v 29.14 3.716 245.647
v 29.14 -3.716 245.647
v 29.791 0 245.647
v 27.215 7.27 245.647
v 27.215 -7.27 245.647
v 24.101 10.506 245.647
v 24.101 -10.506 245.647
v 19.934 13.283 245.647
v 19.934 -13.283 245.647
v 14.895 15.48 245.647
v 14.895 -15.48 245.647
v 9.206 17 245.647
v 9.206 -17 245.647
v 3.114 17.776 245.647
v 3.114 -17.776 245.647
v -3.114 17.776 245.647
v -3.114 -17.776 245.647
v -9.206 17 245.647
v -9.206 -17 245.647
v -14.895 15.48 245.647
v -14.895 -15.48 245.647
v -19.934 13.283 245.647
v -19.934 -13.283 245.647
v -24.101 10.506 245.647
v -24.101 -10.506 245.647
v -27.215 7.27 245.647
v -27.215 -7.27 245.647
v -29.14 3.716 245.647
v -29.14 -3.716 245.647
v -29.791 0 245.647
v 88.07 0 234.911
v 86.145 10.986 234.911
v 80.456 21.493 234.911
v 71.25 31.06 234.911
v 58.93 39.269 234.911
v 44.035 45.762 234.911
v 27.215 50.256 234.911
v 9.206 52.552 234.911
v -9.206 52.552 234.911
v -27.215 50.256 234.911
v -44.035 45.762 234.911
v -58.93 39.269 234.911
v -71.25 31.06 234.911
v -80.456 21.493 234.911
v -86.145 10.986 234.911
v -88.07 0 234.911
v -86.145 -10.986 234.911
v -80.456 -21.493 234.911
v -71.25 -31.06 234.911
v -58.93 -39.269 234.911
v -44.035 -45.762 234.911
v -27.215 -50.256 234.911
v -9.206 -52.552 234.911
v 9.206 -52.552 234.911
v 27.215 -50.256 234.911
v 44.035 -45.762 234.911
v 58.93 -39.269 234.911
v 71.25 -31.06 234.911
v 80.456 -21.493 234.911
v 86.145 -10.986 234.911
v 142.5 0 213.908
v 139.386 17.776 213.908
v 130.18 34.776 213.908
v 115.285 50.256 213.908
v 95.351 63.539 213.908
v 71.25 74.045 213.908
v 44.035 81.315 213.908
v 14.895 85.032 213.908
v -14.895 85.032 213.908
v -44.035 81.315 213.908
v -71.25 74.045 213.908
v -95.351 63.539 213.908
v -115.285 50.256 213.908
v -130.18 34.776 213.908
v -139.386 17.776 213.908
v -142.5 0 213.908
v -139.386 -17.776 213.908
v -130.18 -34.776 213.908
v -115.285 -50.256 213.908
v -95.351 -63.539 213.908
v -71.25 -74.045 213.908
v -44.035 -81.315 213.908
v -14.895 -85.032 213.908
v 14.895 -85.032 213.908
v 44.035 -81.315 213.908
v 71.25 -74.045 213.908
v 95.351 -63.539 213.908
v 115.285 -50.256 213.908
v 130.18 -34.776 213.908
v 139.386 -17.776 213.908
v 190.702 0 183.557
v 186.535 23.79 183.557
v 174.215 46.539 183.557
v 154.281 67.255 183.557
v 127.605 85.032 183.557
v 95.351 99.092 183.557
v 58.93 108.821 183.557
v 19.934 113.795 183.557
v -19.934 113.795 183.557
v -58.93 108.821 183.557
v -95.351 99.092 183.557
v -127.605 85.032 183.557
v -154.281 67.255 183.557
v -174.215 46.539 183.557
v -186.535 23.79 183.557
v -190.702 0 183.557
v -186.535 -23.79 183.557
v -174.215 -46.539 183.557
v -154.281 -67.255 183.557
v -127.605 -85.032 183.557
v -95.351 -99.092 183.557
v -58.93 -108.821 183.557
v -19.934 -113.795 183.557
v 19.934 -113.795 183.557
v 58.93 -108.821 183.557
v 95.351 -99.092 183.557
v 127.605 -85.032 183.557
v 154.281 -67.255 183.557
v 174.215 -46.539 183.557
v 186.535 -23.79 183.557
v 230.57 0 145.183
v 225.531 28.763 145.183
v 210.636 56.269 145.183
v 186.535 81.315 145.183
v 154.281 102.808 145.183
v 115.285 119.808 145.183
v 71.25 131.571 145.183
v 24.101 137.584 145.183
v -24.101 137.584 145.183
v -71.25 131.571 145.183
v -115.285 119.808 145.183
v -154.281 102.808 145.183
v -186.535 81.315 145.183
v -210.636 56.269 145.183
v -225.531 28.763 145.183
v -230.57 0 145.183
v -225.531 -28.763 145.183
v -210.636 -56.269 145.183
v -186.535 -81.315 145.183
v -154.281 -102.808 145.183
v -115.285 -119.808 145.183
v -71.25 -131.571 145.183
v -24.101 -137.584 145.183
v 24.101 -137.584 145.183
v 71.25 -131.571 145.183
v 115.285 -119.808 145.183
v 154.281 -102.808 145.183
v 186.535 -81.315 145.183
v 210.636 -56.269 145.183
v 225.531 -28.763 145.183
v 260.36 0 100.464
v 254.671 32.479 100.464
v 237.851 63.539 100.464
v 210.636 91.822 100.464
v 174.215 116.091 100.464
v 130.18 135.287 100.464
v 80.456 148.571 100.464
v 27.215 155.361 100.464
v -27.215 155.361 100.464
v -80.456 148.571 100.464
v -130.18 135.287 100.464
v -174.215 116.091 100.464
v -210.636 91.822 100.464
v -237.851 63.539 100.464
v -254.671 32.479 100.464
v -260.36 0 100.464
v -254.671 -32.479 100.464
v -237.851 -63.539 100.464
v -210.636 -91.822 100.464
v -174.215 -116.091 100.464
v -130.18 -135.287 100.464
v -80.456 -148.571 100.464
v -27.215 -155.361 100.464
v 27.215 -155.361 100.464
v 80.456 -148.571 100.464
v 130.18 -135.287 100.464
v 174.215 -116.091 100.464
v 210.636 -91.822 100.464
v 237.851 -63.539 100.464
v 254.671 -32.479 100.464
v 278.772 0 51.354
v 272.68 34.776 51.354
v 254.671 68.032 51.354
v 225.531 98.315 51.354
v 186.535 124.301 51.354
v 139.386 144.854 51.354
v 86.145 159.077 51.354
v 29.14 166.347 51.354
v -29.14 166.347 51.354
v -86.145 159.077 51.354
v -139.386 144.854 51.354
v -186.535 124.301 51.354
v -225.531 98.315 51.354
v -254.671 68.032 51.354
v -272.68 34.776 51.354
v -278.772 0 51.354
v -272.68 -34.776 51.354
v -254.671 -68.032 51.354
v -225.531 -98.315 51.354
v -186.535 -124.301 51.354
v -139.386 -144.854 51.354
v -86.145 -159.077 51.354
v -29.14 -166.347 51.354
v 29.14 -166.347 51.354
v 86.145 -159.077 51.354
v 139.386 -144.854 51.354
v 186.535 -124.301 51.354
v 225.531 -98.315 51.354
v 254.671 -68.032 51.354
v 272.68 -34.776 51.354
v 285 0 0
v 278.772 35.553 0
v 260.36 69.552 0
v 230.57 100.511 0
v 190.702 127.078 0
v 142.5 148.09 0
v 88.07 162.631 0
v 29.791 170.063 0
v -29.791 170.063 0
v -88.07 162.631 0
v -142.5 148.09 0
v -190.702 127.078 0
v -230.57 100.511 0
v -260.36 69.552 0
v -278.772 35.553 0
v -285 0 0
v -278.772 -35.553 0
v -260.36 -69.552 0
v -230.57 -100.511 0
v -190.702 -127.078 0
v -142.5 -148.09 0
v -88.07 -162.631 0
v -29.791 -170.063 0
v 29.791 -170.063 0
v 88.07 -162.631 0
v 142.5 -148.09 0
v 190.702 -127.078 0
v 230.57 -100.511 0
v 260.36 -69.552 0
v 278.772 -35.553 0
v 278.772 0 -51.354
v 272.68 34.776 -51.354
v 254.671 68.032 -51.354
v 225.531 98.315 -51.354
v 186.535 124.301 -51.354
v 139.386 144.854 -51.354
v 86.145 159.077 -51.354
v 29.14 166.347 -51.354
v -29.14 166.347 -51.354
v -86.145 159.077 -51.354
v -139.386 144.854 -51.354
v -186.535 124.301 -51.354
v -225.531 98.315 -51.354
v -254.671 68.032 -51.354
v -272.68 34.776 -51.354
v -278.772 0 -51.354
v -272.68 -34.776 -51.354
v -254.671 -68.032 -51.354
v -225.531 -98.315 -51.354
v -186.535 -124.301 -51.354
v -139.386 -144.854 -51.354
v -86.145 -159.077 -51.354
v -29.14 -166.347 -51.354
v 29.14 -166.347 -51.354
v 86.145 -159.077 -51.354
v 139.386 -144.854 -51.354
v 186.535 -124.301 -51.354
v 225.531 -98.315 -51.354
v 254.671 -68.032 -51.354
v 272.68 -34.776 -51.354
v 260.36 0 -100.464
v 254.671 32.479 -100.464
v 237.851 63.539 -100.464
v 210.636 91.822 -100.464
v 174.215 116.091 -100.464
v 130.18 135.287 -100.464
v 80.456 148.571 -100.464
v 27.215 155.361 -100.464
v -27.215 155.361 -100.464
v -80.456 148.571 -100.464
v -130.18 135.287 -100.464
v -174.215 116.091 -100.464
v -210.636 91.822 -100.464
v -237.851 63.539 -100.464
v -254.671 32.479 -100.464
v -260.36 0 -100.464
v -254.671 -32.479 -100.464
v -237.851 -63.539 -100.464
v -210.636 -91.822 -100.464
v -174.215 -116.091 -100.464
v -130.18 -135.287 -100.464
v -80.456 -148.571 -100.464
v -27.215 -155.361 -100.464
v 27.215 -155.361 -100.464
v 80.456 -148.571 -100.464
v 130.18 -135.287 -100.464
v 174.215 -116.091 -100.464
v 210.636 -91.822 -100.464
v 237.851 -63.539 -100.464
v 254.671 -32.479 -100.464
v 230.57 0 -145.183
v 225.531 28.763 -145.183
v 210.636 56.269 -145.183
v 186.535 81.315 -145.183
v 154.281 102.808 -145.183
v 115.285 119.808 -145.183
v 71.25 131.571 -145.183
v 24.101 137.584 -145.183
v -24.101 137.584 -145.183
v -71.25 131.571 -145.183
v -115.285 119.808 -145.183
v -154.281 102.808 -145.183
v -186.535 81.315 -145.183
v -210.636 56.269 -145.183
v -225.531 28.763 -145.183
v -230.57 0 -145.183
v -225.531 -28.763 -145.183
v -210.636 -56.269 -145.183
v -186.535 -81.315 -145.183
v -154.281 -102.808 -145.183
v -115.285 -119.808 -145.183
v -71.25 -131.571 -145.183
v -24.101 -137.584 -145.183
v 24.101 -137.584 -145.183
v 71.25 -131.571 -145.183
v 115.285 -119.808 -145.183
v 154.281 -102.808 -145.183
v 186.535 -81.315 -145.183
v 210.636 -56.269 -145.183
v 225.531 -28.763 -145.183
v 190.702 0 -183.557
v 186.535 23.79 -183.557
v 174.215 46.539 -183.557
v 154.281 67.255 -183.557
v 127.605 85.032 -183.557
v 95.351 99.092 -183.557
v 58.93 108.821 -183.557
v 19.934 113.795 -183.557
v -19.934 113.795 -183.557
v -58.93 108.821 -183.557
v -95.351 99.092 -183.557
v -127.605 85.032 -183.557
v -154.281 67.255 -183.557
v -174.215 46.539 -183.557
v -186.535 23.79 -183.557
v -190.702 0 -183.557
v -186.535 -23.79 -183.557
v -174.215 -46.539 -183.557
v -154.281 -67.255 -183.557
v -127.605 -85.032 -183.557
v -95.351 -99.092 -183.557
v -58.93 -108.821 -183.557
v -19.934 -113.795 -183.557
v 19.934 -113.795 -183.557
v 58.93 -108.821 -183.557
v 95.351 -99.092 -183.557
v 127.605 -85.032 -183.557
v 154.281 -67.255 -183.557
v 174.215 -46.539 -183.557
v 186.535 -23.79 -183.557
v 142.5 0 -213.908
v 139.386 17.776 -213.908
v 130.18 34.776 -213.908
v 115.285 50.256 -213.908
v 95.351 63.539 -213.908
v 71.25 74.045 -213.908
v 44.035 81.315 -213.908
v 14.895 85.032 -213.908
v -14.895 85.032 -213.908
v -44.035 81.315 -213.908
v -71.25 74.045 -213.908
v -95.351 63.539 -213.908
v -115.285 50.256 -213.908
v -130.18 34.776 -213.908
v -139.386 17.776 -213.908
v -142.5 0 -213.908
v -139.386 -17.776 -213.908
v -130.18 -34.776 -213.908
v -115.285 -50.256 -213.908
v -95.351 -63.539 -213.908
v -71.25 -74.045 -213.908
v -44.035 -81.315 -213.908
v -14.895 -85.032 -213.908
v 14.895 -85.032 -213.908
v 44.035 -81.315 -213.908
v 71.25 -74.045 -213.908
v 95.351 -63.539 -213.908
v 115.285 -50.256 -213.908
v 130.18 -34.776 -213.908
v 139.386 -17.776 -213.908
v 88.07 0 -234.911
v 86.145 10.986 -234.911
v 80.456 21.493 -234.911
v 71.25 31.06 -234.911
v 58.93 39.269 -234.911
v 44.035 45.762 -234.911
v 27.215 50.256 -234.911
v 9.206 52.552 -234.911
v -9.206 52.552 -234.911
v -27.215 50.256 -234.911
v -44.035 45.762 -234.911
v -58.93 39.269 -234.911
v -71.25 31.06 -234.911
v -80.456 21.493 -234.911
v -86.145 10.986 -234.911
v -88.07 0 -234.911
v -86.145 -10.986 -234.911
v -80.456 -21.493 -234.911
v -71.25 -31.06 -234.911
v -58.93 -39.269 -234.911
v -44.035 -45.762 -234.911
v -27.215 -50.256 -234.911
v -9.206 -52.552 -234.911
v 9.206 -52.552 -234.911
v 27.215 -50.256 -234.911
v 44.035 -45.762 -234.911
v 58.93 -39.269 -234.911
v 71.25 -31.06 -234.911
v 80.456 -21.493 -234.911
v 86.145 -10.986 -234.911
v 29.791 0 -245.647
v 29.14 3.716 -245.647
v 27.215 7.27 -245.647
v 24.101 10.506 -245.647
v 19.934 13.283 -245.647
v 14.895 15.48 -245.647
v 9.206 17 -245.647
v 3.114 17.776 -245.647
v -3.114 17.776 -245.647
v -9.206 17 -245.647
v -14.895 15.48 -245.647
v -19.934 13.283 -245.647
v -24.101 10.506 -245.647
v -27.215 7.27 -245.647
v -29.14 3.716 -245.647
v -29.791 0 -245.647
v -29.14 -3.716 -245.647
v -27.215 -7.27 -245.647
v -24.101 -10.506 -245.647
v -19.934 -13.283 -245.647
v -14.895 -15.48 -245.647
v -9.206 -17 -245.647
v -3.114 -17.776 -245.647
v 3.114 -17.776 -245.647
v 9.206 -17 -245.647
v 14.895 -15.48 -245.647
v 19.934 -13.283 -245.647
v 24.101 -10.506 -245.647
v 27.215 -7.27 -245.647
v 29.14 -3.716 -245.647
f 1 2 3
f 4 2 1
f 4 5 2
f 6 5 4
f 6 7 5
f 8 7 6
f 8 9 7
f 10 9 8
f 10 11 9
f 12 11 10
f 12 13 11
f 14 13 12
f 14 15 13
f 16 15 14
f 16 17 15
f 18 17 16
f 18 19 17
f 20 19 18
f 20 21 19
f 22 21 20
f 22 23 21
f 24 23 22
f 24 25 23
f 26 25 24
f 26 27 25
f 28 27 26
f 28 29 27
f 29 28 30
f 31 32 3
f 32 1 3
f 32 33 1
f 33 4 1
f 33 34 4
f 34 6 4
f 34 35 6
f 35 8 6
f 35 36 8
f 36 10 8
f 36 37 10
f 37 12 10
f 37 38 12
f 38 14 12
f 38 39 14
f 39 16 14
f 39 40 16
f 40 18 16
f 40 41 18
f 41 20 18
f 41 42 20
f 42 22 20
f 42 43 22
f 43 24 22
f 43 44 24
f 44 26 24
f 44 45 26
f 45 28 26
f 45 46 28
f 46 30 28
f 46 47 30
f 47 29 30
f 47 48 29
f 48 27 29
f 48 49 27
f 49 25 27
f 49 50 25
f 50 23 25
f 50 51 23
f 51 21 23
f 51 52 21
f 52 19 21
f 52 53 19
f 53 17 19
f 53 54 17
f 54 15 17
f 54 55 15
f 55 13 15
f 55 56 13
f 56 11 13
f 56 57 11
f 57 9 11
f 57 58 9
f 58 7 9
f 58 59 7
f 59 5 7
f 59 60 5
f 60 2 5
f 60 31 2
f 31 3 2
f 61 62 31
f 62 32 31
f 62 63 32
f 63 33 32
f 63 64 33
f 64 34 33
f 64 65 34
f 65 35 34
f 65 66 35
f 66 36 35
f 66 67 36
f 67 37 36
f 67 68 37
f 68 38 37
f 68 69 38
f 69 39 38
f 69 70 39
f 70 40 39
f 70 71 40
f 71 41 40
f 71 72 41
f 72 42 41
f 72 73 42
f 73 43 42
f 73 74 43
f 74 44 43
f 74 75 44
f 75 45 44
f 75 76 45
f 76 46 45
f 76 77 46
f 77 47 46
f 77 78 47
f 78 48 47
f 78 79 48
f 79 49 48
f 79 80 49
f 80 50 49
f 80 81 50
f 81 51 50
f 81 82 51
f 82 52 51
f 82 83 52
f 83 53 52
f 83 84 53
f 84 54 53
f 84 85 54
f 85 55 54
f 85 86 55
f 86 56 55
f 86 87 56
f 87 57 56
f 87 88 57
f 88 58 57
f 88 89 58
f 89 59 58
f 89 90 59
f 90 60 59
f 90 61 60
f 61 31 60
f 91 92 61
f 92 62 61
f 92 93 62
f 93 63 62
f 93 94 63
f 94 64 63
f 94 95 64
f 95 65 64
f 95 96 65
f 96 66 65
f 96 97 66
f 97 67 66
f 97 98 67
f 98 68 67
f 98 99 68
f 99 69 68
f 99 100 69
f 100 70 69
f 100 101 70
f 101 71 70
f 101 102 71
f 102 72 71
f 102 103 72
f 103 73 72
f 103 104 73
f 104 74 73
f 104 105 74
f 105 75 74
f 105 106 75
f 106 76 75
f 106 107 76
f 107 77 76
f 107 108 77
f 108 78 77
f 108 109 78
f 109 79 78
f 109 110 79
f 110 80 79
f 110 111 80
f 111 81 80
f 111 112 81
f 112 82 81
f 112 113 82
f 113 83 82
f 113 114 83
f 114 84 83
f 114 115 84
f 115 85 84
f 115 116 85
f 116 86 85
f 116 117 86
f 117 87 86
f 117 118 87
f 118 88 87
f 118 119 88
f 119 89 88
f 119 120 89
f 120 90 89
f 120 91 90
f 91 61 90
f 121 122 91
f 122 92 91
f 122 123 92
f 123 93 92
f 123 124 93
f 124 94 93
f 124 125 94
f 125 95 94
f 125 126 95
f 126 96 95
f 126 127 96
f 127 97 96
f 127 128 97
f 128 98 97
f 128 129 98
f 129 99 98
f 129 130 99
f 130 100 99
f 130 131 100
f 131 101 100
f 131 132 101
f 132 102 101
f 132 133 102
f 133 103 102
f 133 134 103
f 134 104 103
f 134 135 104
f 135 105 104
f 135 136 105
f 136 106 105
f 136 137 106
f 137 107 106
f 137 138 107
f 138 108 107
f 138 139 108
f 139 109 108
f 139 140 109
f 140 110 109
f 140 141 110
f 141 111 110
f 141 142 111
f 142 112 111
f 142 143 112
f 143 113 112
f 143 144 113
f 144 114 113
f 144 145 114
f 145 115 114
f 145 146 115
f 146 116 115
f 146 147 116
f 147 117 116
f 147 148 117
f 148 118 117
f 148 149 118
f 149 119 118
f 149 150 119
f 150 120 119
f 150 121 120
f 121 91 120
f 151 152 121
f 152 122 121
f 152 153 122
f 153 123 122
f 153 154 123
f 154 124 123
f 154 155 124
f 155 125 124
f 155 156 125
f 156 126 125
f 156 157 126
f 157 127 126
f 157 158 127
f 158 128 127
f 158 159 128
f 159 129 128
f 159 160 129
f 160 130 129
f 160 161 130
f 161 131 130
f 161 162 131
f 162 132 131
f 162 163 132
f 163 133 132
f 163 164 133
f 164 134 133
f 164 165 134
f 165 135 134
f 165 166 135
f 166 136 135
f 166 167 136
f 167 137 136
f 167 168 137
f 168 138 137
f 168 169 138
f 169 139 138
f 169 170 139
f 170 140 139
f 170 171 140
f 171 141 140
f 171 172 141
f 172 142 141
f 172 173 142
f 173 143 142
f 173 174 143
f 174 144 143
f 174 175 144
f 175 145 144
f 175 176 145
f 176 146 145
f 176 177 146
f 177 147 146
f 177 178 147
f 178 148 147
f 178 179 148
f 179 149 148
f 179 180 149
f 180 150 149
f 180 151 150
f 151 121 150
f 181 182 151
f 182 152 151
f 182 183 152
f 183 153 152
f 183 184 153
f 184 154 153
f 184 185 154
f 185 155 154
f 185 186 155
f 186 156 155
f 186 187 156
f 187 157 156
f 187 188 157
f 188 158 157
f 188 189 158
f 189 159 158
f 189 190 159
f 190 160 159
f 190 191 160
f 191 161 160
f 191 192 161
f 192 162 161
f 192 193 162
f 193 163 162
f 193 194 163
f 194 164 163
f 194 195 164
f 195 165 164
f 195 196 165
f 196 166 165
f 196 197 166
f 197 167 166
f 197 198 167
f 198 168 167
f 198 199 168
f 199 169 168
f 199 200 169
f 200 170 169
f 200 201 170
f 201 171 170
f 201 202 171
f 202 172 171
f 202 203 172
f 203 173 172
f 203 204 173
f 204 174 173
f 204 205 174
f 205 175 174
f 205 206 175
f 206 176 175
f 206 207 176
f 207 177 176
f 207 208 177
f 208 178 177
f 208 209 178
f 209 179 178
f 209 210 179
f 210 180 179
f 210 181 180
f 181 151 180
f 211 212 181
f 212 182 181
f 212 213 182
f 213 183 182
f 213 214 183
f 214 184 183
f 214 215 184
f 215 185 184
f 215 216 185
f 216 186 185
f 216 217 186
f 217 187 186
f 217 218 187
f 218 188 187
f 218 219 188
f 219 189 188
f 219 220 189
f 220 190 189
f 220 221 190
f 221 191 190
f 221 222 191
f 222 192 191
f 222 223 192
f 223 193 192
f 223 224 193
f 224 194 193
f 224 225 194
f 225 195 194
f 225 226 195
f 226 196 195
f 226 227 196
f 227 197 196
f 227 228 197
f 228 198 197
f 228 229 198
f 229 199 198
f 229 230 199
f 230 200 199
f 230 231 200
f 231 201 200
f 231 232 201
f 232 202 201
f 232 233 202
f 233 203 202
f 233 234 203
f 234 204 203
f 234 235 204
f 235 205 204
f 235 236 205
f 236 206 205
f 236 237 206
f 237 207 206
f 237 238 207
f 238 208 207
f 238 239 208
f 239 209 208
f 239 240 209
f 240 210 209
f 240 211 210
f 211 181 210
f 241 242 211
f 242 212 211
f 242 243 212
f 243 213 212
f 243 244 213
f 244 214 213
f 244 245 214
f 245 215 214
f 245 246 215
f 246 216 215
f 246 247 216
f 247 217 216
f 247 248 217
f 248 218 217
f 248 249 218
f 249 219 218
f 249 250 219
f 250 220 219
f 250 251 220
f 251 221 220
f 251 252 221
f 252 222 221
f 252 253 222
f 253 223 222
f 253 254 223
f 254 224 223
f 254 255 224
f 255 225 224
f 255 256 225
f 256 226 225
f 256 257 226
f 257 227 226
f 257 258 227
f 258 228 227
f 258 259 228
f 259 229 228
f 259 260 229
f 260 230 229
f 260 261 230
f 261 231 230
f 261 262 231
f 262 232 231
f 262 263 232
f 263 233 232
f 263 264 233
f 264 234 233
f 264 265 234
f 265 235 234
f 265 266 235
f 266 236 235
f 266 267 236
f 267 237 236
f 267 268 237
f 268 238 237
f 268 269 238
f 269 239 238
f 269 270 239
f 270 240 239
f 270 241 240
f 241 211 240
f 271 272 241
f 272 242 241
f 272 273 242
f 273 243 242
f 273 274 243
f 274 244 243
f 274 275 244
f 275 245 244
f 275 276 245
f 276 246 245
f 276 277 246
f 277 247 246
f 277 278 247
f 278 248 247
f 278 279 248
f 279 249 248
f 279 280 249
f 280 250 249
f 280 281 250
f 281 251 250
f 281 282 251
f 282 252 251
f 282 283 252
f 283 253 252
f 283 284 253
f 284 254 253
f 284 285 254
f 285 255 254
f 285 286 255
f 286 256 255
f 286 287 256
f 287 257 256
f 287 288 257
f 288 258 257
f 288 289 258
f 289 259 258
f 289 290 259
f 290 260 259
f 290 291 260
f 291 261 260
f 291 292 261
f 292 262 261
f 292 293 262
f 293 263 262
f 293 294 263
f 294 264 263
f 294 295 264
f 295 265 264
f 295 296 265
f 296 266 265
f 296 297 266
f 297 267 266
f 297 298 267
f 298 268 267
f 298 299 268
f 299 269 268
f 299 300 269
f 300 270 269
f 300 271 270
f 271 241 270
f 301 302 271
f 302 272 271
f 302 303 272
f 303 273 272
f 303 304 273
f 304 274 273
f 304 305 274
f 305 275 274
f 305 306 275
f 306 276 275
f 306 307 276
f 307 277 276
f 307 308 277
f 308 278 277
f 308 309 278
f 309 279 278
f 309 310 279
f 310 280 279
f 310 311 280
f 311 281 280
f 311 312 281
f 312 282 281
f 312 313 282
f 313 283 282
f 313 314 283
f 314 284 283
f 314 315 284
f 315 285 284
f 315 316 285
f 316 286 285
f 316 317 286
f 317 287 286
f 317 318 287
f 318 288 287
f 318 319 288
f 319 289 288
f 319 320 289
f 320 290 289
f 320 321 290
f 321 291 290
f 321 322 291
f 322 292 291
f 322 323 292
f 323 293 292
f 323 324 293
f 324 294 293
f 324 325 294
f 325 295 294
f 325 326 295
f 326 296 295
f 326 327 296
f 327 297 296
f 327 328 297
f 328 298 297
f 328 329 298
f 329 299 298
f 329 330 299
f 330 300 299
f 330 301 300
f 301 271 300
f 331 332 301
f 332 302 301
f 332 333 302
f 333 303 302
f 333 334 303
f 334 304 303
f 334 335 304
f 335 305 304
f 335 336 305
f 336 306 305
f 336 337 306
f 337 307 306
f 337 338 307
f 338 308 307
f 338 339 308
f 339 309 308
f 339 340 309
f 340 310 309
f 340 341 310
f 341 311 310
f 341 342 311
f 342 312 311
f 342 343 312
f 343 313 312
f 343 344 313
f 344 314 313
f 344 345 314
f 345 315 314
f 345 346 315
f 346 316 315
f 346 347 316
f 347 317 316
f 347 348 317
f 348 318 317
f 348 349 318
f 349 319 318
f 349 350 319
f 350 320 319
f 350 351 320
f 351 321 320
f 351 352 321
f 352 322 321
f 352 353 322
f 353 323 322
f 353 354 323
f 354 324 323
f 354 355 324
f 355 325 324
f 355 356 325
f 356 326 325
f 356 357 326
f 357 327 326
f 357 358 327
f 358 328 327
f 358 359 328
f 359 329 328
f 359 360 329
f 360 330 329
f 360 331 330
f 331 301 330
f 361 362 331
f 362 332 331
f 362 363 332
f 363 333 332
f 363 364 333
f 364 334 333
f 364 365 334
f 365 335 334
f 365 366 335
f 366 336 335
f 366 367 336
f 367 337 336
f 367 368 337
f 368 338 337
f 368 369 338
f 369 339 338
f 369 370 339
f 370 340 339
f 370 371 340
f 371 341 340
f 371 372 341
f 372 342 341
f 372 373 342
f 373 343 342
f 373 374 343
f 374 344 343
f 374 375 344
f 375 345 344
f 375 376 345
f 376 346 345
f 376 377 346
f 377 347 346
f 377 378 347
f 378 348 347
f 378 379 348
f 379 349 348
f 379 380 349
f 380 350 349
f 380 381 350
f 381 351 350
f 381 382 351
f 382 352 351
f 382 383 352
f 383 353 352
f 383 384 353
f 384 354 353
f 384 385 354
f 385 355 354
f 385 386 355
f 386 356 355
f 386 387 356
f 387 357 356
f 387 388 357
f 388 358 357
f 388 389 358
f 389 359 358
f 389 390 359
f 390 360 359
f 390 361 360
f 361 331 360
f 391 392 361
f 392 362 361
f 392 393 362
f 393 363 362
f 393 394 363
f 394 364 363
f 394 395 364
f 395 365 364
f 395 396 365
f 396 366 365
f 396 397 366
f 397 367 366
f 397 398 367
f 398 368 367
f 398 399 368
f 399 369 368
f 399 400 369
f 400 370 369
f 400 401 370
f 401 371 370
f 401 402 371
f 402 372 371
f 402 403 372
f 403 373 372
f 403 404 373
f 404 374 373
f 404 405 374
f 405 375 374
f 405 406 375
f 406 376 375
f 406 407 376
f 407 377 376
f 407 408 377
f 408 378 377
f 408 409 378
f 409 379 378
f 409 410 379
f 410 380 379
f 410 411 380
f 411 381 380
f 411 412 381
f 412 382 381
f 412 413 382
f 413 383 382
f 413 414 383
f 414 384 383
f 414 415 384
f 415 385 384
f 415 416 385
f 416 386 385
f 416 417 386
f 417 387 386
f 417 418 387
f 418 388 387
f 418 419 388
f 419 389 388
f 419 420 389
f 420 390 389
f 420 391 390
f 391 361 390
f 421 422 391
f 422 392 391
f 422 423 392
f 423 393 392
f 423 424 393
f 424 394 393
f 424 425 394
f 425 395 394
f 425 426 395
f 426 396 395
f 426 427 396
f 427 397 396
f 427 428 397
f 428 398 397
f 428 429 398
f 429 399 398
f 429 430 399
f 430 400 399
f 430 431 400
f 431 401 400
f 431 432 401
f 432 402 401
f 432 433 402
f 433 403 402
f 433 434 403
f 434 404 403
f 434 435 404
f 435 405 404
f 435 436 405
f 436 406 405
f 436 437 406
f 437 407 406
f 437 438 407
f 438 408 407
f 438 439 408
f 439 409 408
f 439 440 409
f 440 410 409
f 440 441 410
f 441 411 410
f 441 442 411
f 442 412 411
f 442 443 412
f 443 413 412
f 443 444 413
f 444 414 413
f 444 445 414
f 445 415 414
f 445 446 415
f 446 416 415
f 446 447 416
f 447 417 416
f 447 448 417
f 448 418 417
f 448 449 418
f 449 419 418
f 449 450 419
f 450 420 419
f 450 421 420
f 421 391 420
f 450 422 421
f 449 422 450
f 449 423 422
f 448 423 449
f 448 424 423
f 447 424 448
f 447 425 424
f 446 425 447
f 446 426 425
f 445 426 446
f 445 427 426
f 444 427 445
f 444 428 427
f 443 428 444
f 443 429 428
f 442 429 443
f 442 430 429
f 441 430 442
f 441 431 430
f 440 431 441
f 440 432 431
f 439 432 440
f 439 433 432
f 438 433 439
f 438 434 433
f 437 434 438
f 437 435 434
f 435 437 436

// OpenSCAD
// Generated by SolidPython 1.0.1 on 2020-07-29 00:46:52


scale(v = [15, 9, 13]) {
	sphere(r = 19);
}
/***********************************************
*********      SolidPython code:      **********
************************************************
 
# import packages: SolidPython
from solid import *
from solid.utils import *
from itertools import chain, combinations, permutations


class Resize:

    def __init__(self, scad_file):
        self.scad_file = scad_file
        #self.scad_file = import_scad(scad_file)
        # cone/cylinder param:
        self.r1 = 0
        self.r2 = 0
        self.h = 0
        # rectangular prism param:
        self.w = 0
        self.l = 0
        # ellipse param:
        self.r = 0

    # import OpenScad code (file name corresponds to shape)


    # classify shape + parameters
    def assign(self, param1, param2, param3):
        if self.scad_file == 'cone.scad':
            self.r1 = param1
            self.r2 = param2
            self.h = param3
        elif self.scad_file == 'cylinder.scad':
            self.r1 = param1
            self.r2 = param2
            self.h = param3
        elif self.scad_file == 'rectangularPrism.scad':
            self.h = param1
            self.l = param2
            self.w = param3
        else:
            self.r = param1
            self.h = param2

    # resize parameters
    def iterate(self):
        x = range(3, 20, 2)
        i = 1
        if self.scad_file == 'cone.scad':
            tempList = list(permutations(x, 2))
            for temp in tempList:
                param1 = temp[0]
                param2 = temp[1]
                filepath = 'produced_scad_files/' + 'cone' + str(param1) + '_' + str(param2) + '_' + '.scad'
                scad_render_to_file(cylinder(h=param1, r1=param2, r2=0), filepath)

        elif self.scad_file == 'cylinder.scad':
            tempList = list(permutations(x, 3))
            for temp in tempList:
                param1 = temp[0]
                param2 = temp[1]
                filepath = 'produced_scad_files/' + 'cylinder' + str(param1) + '_' + str(param2) + '_' + '.scad'
                scad_render_to_file(cylinder(h=param1, r1=param2, r2=param2), filepath)

        elif self.scad_file == 'rectangularPrism.scad':
            tempList = list(permutations(x, 3))
            for temp in tempList:
                param1 = temp[0]
                param2 = temp[1]
                param3 = temp[2]
                filepath = 'produced_scad_files/' + 'rectangularPrism' + str(param1) + '_' + str(param2) + '_' + str(
                    param3) + '.scad'
                scad_render_to_file(cube(size=(param1, param2, param3)), filepath)

        elif self.scad_file == 'ellipse.scad':
            tempList = list(permutations(x, 4))
            for temp in tempList:
                param1 = temp[0]
                param2 = temp[1]
                param3 = temp[2]
                param4 = temp[3]
                filepath = 'produced_scad_files/' + 'ellipse' + str(param1) + '_' + str(param2) + '_' + str(param3) + '_' + str(param4) + '.scad'
                scad_render_to_file(scale([param1, param2, param3])(sphere(r=param4)), filepath)

    def render_to_scadfile(self):
        scad_render_to_file(scad, 'example.scad') 
 
************************************************/
